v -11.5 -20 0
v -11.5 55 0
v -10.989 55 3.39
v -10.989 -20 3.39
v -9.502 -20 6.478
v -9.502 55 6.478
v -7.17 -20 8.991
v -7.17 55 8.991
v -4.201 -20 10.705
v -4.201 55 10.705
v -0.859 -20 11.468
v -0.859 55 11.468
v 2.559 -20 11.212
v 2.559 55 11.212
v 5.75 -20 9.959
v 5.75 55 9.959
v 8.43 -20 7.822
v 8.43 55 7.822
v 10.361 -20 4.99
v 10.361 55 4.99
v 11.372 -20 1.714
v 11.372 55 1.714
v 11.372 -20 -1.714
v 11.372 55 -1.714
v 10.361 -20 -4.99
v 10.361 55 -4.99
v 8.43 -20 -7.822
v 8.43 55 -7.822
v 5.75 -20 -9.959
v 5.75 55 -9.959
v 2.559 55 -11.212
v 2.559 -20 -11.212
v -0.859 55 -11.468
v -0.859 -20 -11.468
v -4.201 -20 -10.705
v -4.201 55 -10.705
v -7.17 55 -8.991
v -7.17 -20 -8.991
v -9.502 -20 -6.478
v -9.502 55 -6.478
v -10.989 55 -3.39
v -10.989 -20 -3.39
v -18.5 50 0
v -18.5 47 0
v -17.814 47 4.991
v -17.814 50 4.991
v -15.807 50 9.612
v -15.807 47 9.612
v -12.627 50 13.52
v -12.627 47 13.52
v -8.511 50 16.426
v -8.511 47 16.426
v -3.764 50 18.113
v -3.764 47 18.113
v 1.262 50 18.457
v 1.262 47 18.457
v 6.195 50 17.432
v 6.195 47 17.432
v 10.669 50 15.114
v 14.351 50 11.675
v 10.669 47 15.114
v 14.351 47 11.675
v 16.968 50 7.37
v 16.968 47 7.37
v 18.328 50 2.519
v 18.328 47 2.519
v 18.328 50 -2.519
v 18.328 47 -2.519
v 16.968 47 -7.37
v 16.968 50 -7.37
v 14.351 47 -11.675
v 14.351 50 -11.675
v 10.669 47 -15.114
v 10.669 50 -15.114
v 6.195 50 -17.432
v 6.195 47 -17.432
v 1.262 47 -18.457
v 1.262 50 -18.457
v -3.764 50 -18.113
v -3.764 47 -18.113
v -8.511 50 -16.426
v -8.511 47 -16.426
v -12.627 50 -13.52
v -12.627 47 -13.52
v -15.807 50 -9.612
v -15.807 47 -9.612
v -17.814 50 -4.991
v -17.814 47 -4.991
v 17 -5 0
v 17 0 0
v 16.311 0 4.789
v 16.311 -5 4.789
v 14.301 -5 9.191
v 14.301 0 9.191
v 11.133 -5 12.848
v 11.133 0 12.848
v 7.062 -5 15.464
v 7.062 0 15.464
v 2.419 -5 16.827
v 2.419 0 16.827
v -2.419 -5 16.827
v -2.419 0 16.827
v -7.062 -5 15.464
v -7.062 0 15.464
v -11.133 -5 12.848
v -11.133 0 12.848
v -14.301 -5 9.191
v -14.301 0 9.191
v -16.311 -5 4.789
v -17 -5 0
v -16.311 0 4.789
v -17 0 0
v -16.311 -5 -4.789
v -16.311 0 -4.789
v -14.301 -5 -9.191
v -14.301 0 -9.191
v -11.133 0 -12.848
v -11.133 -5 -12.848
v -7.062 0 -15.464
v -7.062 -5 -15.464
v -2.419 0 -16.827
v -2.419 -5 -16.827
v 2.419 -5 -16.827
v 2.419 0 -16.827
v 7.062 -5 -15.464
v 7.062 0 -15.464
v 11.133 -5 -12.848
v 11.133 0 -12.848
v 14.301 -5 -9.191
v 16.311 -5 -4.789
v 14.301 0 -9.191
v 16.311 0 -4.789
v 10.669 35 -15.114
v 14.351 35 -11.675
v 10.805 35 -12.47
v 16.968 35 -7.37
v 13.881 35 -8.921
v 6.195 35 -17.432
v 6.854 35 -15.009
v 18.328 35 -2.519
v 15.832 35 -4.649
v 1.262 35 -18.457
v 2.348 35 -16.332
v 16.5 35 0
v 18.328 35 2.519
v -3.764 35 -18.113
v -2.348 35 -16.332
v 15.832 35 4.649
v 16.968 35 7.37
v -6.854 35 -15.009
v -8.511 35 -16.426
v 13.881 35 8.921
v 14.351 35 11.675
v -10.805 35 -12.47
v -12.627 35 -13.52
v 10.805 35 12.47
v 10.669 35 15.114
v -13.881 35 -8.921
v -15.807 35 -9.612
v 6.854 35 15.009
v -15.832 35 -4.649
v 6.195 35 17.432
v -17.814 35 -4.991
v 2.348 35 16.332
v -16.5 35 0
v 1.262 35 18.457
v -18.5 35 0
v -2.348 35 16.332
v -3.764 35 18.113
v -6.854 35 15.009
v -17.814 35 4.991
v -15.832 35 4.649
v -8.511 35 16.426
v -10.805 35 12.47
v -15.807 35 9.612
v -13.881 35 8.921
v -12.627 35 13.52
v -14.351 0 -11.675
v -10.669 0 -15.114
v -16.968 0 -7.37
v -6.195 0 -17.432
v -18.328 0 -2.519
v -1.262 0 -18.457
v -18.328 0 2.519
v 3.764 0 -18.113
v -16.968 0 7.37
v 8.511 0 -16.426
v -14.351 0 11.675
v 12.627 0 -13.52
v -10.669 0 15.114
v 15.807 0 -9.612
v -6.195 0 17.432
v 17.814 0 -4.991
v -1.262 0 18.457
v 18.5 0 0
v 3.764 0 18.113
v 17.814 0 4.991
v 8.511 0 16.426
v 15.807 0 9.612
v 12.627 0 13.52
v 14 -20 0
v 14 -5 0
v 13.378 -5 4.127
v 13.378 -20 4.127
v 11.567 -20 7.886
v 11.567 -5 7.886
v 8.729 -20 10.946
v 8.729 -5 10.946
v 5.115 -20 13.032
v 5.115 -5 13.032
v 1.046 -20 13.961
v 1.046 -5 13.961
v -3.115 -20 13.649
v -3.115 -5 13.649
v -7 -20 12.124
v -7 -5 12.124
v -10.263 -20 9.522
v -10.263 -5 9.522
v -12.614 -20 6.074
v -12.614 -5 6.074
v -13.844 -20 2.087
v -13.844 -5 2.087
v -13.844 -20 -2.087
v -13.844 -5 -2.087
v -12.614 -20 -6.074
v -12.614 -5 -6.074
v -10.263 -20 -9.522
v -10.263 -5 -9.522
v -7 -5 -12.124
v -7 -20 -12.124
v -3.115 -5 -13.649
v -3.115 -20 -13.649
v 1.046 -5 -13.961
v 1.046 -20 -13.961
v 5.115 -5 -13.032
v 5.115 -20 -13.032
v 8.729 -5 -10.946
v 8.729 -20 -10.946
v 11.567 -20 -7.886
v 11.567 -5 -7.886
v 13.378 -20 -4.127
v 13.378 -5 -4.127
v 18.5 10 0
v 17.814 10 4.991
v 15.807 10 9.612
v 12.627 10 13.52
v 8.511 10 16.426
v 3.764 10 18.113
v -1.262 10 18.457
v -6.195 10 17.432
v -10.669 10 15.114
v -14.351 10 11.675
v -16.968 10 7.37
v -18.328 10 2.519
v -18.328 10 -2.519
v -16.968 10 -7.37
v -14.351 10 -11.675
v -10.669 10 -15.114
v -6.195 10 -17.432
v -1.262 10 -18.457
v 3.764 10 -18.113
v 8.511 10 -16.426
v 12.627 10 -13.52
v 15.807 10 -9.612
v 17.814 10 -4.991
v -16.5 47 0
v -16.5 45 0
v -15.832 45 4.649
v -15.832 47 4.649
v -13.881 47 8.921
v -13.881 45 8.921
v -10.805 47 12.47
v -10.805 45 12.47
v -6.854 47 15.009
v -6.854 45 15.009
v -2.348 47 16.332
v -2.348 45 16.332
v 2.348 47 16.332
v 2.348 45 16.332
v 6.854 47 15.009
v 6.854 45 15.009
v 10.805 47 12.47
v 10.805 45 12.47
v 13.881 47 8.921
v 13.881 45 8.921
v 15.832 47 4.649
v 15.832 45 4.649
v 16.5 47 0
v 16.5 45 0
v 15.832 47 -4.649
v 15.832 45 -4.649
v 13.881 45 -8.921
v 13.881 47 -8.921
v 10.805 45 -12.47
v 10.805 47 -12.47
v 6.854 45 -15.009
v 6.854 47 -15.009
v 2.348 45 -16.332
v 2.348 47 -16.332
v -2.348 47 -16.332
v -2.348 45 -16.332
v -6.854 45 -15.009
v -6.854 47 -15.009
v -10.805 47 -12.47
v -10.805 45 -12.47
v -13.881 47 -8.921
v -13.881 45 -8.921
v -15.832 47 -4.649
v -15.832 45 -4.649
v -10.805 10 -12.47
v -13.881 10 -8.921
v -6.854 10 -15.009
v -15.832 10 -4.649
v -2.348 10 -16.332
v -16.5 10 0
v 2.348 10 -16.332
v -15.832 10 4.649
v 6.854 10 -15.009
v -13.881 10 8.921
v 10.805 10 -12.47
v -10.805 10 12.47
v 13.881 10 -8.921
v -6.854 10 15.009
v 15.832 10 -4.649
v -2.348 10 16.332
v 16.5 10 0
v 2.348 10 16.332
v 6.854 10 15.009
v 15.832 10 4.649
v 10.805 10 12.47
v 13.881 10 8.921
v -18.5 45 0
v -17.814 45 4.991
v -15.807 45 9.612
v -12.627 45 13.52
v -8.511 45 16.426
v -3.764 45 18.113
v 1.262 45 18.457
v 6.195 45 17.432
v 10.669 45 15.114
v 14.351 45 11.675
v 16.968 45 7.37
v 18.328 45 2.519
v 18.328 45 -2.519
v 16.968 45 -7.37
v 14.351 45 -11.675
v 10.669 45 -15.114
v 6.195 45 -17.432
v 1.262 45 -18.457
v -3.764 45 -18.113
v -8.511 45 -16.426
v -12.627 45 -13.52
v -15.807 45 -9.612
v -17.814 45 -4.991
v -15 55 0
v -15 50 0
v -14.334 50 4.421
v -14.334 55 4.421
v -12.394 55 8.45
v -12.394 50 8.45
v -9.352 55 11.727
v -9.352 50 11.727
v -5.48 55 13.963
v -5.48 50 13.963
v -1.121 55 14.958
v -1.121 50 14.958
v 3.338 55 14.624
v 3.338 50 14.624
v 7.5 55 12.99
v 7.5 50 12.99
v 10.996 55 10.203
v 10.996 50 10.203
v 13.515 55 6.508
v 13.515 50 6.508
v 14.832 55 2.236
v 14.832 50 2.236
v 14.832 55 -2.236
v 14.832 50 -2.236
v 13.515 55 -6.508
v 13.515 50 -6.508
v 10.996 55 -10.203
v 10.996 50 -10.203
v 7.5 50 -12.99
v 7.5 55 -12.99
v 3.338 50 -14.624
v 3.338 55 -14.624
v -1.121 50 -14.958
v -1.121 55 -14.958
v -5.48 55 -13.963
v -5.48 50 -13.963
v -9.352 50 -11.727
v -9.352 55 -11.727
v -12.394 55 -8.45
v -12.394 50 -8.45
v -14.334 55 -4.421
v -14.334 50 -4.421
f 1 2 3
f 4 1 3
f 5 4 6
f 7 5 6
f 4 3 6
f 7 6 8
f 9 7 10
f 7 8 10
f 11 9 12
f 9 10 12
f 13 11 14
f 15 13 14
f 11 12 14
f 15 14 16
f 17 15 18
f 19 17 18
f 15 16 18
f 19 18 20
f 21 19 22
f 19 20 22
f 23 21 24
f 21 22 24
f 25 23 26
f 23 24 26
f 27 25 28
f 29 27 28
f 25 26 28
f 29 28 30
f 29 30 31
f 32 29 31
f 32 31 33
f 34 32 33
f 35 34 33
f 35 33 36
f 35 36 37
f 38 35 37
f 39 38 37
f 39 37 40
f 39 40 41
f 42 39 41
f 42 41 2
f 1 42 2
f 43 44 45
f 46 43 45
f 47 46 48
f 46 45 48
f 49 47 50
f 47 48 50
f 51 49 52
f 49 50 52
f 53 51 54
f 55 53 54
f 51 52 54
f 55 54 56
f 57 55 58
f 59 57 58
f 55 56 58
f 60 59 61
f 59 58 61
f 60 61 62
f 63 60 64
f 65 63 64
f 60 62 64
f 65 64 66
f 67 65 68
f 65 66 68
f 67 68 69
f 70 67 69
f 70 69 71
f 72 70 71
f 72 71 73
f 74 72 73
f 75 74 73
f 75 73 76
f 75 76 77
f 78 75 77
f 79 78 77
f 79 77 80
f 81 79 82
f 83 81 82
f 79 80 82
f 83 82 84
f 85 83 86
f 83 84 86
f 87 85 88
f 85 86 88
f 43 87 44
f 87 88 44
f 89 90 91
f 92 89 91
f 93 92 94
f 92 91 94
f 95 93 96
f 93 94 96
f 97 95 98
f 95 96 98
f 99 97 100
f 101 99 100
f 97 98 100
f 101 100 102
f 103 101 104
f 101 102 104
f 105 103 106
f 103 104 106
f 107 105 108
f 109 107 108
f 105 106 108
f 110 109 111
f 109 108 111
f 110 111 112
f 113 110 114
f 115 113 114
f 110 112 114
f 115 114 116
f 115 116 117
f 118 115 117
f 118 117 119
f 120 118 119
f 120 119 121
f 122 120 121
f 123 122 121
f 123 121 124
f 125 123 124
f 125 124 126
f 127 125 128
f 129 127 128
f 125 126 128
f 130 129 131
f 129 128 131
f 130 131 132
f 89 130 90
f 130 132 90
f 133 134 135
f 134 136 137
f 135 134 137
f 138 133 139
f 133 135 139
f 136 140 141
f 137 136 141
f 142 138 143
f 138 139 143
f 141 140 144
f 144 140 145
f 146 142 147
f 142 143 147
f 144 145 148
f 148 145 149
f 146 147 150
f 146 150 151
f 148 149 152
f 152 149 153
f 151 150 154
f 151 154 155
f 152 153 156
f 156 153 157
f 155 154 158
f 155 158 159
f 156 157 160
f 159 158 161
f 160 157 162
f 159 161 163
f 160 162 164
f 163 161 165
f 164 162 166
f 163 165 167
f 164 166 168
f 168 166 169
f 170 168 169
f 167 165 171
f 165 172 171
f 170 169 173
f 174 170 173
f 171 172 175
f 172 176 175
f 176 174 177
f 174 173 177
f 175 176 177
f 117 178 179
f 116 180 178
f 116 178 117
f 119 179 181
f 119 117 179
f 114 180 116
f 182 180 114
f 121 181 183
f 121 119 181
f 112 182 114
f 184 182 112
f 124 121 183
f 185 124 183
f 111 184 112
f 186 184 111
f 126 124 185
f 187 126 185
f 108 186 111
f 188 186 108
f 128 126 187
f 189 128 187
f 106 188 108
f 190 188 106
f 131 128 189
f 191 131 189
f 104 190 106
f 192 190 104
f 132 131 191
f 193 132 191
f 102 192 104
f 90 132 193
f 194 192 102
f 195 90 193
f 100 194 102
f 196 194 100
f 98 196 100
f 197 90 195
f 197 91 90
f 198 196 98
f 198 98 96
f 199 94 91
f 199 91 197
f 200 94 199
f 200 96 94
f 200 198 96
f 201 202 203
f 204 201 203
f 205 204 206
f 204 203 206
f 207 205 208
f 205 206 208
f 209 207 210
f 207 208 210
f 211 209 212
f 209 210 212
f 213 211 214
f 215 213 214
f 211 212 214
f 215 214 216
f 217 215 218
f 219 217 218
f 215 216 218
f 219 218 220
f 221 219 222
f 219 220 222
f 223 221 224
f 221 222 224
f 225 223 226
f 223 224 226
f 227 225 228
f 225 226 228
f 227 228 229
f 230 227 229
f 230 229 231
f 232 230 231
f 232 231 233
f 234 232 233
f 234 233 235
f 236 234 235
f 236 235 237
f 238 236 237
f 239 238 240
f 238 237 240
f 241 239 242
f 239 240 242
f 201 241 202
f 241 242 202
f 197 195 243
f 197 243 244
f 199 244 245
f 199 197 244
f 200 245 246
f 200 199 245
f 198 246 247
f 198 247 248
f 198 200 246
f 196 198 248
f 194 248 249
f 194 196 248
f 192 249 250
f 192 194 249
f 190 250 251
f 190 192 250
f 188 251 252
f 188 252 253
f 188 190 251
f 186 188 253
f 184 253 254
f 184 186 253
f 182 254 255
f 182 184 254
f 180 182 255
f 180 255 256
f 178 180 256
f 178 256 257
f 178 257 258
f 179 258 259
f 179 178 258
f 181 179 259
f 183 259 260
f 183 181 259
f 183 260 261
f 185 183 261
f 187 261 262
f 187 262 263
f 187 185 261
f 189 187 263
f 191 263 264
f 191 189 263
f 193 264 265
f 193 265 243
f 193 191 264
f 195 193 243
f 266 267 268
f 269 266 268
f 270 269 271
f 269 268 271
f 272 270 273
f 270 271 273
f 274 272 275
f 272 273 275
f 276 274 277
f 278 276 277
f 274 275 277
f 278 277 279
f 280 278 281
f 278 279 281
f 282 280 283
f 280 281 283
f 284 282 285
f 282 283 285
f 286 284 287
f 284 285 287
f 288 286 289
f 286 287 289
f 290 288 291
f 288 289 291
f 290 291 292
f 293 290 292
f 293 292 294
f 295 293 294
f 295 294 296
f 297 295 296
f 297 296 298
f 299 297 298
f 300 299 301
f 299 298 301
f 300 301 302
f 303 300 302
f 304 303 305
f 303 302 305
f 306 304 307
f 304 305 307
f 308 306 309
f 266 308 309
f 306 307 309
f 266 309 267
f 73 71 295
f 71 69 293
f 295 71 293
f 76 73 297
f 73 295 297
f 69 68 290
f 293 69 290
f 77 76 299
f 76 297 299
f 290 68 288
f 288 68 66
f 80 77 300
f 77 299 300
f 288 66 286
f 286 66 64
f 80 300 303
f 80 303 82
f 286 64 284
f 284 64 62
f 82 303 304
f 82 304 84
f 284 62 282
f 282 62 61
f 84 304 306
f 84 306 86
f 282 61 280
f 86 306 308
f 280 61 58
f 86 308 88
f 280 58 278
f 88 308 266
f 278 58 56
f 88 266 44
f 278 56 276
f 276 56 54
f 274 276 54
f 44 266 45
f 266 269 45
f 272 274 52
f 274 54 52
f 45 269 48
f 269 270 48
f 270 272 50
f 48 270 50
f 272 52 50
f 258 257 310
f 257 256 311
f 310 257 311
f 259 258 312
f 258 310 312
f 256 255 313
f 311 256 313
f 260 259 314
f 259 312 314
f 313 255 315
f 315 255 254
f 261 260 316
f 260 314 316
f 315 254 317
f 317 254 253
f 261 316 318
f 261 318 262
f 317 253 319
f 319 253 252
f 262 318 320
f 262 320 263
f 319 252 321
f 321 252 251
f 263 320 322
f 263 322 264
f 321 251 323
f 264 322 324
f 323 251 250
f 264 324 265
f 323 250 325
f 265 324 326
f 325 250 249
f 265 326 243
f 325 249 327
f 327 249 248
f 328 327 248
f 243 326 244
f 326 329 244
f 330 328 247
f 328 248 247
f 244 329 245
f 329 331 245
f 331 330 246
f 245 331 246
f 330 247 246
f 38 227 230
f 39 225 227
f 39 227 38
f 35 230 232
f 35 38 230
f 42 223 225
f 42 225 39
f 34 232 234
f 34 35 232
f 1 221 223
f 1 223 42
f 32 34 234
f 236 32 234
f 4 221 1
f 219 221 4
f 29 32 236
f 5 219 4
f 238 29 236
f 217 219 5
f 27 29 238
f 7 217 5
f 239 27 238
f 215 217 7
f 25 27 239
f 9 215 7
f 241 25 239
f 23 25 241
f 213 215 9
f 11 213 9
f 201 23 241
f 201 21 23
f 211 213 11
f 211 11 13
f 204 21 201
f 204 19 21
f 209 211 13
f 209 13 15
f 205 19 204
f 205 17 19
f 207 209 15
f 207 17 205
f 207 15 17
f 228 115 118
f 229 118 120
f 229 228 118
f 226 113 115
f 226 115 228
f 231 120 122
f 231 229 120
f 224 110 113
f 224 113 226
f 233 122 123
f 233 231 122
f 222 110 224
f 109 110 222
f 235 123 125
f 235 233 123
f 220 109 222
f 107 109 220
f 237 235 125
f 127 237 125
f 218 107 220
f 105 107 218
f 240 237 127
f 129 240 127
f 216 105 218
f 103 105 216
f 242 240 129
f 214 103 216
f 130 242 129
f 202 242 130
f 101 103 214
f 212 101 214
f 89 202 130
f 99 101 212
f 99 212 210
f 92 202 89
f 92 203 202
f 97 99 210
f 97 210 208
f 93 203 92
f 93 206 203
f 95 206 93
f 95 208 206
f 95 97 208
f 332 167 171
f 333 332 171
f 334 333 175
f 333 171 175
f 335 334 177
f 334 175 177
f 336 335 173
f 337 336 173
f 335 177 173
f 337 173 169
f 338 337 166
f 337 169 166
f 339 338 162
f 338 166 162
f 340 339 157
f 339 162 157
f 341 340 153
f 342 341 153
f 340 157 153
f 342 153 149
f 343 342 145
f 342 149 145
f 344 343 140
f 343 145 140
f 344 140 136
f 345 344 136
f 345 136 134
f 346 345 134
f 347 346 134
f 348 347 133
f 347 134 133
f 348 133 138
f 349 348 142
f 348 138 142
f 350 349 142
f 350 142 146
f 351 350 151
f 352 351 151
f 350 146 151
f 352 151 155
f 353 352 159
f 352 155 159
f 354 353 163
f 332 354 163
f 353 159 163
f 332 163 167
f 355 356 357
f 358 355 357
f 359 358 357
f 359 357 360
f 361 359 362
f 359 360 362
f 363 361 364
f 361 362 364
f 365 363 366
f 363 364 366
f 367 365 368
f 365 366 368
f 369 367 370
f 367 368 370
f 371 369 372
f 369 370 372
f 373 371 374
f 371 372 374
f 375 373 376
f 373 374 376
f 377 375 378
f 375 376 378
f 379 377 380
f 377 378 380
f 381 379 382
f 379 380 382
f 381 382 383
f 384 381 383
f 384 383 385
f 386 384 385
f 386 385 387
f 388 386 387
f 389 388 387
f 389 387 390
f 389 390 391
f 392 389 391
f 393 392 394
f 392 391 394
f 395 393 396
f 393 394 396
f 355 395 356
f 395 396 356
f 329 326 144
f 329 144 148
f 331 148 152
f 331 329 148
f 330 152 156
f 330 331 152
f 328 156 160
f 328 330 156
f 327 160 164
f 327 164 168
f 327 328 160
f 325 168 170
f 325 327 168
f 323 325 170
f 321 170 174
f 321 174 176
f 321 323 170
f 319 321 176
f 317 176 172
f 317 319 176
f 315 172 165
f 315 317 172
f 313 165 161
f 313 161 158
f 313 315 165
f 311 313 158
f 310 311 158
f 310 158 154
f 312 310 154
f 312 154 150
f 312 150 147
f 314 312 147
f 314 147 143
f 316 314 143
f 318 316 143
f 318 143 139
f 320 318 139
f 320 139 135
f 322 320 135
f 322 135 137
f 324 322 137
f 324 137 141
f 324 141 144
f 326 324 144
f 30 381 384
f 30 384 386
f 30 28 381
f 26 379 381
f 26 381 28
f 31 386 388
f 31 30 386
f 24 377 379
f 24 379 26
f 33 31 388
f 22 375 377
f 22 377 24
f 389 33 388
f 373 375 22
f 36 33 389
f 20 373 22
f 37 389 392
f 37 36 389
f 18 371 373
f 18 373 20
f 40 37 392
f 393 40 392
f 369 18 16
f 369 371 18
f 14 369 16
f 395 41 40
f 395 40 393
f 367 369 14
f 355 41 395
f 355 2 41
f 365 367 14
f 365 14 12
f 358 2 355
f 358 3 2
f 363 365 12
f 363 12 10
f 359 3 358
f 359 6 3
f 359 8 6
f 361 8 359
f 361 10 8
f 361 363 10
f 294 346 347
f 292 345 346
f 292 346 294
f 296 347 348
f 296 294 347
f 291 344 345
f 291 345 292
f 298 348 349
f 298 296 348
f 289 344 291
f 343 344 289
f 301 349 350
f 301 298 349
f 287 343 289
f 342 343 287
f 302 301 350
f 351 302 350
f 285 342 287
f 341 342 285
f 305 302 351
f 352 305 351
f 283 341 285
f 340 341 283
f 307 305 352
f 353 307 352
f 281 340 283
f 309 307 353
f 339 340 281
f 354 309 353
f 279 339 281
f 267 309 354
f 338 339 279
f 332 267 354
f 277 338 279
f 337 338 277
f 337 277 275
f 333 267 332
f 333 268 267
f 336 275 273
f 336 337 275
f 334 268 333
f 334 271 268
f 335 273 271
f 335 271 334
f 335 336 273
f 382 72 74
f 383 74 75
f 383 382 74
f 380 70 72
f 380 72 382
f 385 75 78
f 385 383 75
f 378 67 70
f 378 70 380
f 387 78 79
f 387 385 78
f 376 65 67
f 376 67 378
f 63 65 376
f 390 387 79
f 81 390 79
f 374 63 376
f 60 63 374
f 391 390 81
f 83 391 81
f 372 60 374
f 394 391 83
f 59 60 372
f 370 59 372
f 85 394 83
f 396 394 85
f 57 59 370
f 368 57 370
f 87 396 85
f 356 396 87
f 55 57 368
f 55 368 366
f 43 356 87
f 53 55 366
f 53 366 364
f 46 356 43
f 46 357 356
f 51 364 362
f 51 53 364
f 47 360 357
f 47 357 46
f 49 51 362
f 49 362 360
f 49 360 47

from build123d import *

# Parameters (mm, degrees)
F0_R      = 17
F1_DEPTH  = 5
F2_R      = 14
F3_DEPTH  = 15
F4_R      = 18.5
F5_DEPTH  = 10
F6_R      = 16.5
F7_DEPTH  = 35
F8_R      = 18.5
F9_DEPTH  = 10
F10_R     = 16.5
F11_DEPTH = 2
F12_R     = 18.5
F13_DEPTH = 3
F14_R     = 15
F15_DEPTH = 5
F16_R     = 11.5
F17_DEPTH = 136.4


with BuildPart() as f1:
    # F0 (on Front) → F1 (new body)
    with BuildSketch(Plane.XZ):
        Circle(F0_R)
    extrude(amount=F1_DEPTH)

    # F2 (on face) → F3 (join)
    with BuildSketch(Plane.XZ.offset(5)):
        Circle(F2_R)
    extrude(amount=F3_DEPTH)

    # F4 (on Front) → F5 (join)
    with BuildSketch(Plane.XZ):
        Circle(F4_R)
    extrude(amount=-F5_DEPTH)

    # F6 (on Front) → F7 (join)
    with BuildSketch(Plane.XZ):
        Circle(F6_R)
    extrude(amount=-F7_DEPTH)

    # F8 (on face) → F9 (join)
    with BuildSketch(Plane(origin=(0, 35, 0), x_dir=(-1, 0, 0), z_dir=(0, 1, 0))):
        Circle(F8_R)
    extrude(amount=F9_DEPTH)

    # F10 (on face) → F11 (join)
    with BuildSketch(Plane(origin=(0, 45, 0), x_dir=(-1, 0, 0), z_dir=(0, 1, 0))):
        Circle(F10_R)
    extrude(amount=F11_DEPTH)

    # F12 (on face) → F13 (join)
    with BuildSketch(Plane(origin=(0, 47, 0), x_dir=(-1, 0, 0), z_dir=(0, 1, 0))):
        Circle(F12_R)
    extrude(amount=F13_DEPTH)

    # F14 (on face) → F15 (join)
    with BuildSketch(Plane(origin=(0, 50, 0), x_dir=(-1, 0, 0), z_dir=(0, 1, 0))):
        Circle(F14_R)
    extrude(amount=F15_DEPTH)

    # F16 (on face) → F17 (cut)
    with BuildSketch(Plane(origin=(0, 55, 0), x_dir=(-1, 0, 0), z_dir=(0, 1, 0))):
        Circle(F16_R)
    extrude(amount=-F17_DEPTH, mode=Mode.SUBTRACT)


solid = f1.part
